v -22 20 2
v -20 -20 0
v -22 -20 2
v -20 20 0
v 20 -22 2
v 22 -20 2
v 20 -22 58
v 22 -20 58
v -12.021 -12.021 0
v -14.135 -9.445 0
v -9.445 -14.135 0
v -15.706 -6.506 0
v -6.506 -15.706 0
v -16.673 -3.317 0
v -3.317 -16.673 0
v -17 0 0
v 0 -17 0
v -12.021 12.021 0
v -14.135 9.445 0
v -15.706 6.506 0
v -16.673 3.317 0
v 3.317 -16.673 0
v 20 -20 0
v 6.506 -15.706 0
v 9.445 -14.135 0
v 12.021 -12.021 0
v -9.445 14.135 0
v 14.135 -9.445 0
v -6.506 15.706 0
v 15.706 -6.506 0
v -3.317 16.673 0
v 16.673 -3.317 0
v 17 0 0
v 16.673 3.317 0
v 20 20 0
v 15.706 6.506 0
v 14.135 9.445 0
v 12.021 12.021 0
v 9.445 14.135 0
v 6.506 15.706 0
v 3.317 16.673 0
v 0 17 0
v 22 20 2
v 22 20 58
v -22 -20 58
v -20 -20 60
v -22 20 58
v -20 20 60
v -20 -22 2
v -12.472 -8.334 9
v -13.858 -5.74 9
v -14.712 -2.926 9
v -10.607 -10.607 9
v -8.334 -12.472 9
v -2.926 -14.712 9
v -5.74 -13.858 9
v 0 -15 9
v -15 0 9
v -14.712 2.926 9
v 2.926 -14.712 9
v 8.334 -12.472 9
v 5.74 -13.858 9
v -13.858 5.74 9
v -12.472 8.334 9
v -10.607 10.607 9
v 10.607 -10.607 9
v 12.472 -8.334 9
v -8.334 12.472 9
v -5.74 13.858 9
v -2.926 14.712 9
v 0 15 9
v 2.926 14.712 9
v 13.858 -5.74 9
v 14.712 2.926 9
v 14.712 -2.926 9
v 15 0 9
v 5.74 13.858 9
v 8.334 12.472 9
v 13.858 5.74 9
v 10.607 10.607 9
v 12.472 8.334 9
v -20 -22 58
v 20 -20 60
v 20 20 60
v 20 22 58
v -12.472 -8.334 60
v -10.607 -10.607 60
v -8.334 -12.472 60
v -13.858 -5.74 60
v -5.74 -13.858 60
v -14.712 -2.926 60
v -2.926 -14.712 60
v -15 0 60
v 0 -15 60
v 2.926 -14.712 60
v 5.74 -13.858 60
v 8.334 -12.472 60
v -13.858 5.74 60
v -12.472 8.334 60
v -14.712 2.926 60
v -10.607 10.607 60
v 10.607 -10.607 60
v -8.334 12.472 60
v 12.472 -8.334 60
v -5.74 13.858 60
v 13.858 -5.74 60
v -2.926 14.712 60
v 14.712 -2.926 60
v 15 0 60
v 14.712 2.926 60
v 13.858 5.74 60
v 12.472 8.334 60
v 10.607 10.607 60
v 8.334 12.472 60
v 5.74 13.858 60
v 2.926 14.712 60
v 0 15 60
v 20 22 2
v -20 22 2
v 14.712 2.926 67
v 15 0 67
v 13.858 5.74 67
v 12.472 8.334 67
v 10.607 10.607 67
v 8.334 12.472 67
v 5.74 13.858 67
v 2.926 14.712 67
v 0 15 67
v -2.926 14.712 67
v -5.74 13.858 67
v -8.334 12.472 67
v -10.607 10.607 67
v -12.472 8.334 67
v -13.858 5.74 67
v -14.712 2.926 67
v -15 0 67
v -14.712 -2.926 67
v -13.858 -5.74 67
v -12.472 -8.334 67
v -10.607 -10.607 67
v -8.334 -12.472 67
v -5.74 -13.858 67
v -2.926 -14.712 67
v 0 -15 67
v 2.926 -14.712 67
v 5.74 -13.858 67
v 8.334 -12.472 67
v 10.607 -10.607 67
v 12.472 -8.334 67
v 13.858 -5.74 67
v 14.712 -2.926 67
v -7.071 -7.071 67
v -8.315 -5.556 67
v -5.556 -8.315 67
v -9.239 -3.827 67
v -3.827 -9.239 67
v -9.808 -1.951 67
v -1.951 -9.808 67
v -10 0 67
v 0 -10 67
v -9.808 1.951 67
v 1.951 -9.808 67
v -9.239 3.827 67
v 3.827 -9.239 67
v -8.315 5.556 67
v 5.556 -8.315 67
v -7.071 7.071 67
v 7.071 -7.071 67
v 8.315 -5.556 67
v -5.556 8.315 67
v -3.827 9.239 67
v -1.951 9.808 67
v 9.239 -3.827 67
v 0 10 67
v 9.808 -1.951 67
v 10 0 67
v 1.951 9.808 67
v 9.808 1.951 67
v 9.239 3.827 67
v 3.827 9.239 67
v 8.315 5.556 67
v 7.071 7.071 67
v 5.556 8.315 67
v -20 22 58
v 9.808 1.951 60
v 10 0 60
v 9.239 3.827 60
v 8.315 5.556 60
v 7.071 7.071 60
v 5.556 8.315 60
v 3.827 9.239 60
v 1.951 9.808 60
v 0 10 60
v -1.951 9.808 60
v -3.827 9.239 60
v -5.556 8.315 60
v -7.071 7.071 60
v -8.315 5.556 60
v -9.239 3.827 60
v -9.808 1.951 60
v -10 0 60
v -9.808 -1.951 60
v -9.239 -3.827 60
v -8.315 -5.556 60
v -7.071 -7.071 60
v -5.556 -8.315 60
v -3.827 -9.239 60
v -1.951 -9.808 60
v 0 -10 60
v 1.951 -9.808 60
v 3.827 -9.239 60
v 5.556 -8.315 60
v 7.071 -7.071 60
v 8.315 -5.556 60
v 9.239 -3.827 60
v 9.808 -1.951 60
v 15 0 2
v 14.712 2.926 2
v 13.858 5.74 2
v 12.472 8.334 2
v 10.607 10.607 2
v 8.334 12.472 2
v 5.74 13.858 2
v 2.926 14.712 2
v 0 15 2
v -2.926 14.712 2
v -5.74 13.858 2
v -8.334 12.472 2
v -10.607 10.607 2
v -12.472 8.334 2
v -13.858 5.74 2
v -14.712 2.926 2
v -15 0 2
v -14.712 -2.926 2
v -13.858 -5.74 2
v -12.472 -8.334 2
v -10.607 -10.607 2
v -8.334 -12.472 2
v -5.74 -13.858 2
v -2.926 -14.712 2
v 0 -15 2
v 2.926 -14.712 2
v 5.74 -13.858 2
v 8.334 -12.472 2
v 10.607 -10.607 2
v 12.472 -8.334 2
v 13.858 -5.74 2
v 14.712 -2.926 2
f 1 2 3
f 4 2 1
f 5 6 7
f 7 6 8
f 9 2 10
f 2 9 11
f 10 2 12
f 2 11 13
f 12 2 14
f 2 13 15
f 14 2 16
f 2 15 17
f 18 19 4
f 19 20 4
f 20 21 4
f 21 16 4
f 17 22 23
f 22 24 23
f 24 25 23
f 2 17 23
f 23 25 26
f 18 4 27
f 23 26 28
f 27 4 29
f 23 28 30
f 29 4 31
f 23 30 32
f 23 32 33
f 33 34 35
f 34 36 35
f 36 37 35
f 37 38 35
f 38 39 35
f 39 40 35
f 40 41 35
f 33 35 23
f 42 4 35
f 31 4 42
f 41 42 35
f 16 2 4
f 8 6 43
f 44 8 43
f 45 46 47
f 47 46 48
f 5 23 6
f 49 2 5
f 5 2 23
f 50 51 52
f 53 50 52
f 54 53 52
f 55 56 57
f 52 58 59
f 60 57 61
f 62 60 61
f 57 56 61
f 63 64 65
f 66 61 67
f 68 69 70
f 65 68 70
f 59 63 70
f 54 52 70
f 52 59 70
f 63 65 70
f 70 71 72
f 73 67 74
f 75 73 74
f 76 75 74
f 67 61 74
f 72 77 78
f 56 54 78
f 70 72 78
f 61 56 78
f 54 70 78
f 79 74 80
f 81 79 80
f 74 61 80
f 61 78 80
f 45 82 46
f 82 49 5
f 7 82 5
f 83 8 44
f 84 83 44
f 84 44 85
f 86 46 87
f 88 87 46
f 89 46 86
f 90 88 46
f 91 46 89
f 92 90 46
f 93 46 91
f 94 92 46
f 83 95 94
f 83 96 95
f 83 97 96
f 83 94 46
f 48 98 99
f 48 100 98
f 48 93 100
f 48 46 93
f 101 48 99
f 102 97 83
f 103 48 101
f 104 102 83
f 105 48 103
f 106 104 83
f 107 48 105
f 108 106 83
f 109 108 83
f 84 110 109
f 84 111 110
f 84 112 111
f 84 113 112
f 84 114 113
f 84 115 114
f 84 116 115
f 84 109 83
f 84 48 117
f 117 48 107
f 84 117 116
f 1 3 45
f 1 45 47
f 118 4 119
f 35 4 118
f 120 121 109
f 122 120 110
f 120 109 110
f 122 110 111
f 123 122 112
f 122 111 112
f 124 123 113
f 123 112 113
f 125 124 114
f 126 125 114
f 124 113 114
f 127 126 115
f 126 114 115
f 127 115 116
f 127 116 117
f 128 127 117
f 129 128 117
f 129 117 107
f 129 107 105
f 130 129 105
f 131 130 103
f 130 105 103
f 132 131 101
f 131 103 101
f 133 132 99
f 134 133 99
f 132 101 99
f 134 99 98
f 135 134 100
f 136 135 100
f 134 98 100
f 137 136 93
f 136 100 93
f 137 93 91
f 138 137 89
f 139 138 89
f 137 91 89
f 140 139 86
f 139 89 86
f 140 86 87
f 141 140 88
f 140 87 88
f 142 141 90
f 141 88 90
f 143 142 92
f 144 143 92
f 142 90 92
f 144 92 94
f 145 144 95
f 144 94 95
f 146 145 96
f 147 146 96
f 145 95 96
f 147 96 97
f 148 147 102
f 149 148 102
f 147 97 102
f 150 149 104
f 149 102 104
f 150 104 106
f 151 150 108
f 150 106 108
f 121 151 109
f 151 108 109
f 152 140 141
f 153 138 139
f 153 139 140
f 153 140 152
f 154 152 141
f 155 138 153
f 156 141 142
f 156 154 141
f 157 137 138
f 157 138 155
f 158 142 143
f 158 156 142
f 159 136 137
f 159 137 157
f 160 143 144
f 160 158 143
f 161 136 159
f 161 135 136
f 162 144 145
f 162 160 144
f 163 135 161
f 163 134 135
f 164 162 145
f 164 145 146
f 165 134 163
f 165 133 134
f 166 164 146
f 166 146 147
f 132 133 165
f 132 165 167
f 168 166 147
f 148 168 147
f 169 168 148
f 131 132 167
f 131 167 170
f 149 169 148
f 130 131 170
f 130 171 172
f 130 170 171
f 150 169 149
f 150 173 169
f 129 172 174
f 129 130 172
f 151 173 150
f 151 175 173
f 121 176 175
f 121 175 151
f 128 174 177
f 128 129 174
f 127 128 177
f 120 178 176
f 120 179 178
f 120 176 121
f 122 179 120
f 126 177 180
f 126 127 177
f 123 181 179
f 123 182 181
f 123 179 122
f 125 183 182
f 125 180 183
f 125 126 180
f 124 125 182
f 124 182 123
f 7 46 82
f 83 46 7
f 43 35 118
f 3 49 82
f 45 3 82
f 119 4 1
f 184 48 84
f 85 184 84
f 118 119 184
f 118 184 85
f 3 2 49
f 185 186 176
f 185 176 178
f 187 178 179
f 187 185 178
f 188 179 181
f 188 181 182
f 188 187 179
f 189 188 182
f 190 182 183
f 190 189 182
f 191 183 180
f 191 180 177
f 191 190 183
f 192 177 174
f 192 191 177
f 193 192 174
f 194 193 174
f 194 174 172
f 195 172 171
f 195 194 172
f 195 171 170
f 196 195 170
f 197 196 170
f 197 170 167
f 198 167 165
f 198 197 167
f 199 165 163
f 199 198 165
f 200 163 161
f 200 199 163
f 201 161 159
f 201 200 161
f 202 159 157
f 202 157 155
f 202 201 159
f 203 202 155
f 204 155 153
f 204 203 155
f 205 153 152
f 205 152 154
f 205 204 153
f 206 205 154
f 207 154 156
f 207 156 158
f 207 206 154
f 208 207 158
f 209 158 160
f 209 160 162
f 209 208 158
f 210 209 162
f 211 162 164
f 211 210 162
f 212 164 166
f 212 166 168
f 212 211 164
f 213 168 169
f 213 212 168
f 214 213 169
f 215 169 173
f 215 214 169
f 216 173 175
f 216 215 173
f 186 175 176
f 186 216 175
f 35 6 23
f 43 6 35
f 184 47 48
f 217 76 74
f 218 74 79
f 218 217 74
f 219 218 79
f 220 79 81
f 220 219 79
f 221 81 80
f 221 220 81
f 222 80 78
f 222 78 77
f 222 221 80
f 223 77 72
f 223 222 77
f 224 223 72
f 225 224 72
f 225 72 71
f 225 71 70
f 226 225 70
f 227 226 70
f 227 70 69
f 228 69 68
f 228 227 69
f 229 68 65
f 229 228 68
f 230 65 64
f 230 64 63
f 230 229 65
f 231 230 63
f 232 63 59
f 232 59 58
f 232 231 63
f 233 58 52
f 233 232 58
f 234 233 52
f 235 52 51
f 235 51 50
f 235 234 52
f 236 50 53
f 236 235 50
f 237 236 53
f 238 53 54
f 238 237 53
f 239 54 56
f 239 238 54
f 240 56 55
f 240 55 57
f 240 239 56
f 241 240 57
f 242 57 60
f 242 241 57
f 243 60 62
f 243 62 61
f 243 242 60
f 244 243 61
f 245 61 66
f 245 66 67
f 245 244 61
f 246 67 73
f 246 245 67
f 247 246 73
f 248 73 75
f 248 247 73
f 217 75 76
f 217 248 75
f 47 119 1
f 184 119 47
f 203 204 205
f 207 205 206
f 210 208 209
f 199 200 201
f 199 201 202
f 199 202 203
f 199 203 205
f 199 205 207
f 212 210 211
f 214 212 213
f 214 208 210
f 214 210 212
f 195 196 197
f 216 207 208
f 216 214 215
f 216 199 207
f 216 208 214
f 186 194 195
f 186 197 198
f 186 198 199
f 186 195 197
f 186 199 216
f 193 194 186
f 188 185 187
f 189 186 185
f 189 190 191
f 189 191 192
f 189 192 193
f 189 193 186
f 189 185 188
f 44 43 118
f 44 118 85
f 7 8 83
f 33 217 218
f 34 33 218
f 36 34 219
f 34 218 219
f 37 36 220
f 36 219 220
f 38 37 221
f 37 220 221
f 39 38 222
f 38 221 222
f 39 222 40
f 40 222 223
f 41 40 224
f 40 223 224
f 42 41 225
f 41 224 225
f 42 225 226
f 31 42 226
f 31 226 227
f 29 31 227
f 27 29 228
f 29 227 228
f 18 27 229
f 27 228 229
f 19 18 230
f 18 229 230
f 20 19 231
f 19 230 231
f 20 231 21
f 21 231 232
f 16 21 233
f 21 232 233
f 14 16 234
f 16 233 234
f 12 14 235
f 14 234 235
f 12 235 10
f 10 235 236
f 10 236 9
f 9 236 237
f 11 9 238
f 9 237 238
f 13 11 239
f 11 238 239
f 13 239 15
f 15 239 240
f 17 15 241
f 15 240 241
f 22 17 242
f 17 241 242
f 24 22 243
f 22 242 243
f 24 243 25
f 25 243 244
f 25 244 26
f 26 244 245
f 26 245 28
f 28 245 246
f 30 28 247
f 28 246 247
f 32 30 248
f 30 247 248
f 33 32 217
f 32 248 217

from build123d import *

# Parameters (mm, degrees)
F2_W     = 44
F2_H     = 44
F2_R     = 15
F2_R_2   = 10
F3_DEPTH = 60
F4_R     = 15
F4_R_2   = 10
F5_DEPTH = 7
F6_DEPTH = 9
F8_SIZE  = 2


with BuildPart() as f3:
    # F2 (on Top) → F3 (new body)
    with BuildSketch(Plane.XY):
        Rectangle(F2_W, F2_H)
        Circle(F2_R, mode=Mode.SUBTRACT)
        Circle(F2_R)
        Circle(F2_R_2, mode=Mode.SUBTRACT)
        Circle(F2_R_2)
    extrude(amount=F3_DEPTH)

    # F4 (on face) → F5 (join)
    with BuildSketch(Plane.XY.offset(60)):
        Circle(F4_R)
        Circle(F4_R_2, mode=Mode.SUBTRACT)
    extrude(amount=F5_DEPTH)

    # F2 (on Top) → F6 (cut)
    with BuildSketch(Plane.XY):
        Circle(F2_R)
        Circle(F2_R_2, mode=Mode.SUBTRACT)
        Circle(F2_R_2)
    extrude(amount=F6_DEPTH, mode=Mode.SUBTRACT)

    # F8
    f8_edges = [f3.edges().sort_by_distance(p)[0] for p in [
        (0, -22, 0),
        (22, 0, 0),
        (-22, 0, 0),
        (0, 22, 0),
        (-22, -22, 30),
        (-22, 22, 30),
        (22, 22, 30),
        (22, -22, 30),
        (22, 0, 60),
        (0, -22, 60),
        (-22, 0, 60),
        (0, 22, 60),
        (-15, 0, 0),
    ]]
    chamfer(f8_edges, length=F8_SIZE)


solid = f3.part
